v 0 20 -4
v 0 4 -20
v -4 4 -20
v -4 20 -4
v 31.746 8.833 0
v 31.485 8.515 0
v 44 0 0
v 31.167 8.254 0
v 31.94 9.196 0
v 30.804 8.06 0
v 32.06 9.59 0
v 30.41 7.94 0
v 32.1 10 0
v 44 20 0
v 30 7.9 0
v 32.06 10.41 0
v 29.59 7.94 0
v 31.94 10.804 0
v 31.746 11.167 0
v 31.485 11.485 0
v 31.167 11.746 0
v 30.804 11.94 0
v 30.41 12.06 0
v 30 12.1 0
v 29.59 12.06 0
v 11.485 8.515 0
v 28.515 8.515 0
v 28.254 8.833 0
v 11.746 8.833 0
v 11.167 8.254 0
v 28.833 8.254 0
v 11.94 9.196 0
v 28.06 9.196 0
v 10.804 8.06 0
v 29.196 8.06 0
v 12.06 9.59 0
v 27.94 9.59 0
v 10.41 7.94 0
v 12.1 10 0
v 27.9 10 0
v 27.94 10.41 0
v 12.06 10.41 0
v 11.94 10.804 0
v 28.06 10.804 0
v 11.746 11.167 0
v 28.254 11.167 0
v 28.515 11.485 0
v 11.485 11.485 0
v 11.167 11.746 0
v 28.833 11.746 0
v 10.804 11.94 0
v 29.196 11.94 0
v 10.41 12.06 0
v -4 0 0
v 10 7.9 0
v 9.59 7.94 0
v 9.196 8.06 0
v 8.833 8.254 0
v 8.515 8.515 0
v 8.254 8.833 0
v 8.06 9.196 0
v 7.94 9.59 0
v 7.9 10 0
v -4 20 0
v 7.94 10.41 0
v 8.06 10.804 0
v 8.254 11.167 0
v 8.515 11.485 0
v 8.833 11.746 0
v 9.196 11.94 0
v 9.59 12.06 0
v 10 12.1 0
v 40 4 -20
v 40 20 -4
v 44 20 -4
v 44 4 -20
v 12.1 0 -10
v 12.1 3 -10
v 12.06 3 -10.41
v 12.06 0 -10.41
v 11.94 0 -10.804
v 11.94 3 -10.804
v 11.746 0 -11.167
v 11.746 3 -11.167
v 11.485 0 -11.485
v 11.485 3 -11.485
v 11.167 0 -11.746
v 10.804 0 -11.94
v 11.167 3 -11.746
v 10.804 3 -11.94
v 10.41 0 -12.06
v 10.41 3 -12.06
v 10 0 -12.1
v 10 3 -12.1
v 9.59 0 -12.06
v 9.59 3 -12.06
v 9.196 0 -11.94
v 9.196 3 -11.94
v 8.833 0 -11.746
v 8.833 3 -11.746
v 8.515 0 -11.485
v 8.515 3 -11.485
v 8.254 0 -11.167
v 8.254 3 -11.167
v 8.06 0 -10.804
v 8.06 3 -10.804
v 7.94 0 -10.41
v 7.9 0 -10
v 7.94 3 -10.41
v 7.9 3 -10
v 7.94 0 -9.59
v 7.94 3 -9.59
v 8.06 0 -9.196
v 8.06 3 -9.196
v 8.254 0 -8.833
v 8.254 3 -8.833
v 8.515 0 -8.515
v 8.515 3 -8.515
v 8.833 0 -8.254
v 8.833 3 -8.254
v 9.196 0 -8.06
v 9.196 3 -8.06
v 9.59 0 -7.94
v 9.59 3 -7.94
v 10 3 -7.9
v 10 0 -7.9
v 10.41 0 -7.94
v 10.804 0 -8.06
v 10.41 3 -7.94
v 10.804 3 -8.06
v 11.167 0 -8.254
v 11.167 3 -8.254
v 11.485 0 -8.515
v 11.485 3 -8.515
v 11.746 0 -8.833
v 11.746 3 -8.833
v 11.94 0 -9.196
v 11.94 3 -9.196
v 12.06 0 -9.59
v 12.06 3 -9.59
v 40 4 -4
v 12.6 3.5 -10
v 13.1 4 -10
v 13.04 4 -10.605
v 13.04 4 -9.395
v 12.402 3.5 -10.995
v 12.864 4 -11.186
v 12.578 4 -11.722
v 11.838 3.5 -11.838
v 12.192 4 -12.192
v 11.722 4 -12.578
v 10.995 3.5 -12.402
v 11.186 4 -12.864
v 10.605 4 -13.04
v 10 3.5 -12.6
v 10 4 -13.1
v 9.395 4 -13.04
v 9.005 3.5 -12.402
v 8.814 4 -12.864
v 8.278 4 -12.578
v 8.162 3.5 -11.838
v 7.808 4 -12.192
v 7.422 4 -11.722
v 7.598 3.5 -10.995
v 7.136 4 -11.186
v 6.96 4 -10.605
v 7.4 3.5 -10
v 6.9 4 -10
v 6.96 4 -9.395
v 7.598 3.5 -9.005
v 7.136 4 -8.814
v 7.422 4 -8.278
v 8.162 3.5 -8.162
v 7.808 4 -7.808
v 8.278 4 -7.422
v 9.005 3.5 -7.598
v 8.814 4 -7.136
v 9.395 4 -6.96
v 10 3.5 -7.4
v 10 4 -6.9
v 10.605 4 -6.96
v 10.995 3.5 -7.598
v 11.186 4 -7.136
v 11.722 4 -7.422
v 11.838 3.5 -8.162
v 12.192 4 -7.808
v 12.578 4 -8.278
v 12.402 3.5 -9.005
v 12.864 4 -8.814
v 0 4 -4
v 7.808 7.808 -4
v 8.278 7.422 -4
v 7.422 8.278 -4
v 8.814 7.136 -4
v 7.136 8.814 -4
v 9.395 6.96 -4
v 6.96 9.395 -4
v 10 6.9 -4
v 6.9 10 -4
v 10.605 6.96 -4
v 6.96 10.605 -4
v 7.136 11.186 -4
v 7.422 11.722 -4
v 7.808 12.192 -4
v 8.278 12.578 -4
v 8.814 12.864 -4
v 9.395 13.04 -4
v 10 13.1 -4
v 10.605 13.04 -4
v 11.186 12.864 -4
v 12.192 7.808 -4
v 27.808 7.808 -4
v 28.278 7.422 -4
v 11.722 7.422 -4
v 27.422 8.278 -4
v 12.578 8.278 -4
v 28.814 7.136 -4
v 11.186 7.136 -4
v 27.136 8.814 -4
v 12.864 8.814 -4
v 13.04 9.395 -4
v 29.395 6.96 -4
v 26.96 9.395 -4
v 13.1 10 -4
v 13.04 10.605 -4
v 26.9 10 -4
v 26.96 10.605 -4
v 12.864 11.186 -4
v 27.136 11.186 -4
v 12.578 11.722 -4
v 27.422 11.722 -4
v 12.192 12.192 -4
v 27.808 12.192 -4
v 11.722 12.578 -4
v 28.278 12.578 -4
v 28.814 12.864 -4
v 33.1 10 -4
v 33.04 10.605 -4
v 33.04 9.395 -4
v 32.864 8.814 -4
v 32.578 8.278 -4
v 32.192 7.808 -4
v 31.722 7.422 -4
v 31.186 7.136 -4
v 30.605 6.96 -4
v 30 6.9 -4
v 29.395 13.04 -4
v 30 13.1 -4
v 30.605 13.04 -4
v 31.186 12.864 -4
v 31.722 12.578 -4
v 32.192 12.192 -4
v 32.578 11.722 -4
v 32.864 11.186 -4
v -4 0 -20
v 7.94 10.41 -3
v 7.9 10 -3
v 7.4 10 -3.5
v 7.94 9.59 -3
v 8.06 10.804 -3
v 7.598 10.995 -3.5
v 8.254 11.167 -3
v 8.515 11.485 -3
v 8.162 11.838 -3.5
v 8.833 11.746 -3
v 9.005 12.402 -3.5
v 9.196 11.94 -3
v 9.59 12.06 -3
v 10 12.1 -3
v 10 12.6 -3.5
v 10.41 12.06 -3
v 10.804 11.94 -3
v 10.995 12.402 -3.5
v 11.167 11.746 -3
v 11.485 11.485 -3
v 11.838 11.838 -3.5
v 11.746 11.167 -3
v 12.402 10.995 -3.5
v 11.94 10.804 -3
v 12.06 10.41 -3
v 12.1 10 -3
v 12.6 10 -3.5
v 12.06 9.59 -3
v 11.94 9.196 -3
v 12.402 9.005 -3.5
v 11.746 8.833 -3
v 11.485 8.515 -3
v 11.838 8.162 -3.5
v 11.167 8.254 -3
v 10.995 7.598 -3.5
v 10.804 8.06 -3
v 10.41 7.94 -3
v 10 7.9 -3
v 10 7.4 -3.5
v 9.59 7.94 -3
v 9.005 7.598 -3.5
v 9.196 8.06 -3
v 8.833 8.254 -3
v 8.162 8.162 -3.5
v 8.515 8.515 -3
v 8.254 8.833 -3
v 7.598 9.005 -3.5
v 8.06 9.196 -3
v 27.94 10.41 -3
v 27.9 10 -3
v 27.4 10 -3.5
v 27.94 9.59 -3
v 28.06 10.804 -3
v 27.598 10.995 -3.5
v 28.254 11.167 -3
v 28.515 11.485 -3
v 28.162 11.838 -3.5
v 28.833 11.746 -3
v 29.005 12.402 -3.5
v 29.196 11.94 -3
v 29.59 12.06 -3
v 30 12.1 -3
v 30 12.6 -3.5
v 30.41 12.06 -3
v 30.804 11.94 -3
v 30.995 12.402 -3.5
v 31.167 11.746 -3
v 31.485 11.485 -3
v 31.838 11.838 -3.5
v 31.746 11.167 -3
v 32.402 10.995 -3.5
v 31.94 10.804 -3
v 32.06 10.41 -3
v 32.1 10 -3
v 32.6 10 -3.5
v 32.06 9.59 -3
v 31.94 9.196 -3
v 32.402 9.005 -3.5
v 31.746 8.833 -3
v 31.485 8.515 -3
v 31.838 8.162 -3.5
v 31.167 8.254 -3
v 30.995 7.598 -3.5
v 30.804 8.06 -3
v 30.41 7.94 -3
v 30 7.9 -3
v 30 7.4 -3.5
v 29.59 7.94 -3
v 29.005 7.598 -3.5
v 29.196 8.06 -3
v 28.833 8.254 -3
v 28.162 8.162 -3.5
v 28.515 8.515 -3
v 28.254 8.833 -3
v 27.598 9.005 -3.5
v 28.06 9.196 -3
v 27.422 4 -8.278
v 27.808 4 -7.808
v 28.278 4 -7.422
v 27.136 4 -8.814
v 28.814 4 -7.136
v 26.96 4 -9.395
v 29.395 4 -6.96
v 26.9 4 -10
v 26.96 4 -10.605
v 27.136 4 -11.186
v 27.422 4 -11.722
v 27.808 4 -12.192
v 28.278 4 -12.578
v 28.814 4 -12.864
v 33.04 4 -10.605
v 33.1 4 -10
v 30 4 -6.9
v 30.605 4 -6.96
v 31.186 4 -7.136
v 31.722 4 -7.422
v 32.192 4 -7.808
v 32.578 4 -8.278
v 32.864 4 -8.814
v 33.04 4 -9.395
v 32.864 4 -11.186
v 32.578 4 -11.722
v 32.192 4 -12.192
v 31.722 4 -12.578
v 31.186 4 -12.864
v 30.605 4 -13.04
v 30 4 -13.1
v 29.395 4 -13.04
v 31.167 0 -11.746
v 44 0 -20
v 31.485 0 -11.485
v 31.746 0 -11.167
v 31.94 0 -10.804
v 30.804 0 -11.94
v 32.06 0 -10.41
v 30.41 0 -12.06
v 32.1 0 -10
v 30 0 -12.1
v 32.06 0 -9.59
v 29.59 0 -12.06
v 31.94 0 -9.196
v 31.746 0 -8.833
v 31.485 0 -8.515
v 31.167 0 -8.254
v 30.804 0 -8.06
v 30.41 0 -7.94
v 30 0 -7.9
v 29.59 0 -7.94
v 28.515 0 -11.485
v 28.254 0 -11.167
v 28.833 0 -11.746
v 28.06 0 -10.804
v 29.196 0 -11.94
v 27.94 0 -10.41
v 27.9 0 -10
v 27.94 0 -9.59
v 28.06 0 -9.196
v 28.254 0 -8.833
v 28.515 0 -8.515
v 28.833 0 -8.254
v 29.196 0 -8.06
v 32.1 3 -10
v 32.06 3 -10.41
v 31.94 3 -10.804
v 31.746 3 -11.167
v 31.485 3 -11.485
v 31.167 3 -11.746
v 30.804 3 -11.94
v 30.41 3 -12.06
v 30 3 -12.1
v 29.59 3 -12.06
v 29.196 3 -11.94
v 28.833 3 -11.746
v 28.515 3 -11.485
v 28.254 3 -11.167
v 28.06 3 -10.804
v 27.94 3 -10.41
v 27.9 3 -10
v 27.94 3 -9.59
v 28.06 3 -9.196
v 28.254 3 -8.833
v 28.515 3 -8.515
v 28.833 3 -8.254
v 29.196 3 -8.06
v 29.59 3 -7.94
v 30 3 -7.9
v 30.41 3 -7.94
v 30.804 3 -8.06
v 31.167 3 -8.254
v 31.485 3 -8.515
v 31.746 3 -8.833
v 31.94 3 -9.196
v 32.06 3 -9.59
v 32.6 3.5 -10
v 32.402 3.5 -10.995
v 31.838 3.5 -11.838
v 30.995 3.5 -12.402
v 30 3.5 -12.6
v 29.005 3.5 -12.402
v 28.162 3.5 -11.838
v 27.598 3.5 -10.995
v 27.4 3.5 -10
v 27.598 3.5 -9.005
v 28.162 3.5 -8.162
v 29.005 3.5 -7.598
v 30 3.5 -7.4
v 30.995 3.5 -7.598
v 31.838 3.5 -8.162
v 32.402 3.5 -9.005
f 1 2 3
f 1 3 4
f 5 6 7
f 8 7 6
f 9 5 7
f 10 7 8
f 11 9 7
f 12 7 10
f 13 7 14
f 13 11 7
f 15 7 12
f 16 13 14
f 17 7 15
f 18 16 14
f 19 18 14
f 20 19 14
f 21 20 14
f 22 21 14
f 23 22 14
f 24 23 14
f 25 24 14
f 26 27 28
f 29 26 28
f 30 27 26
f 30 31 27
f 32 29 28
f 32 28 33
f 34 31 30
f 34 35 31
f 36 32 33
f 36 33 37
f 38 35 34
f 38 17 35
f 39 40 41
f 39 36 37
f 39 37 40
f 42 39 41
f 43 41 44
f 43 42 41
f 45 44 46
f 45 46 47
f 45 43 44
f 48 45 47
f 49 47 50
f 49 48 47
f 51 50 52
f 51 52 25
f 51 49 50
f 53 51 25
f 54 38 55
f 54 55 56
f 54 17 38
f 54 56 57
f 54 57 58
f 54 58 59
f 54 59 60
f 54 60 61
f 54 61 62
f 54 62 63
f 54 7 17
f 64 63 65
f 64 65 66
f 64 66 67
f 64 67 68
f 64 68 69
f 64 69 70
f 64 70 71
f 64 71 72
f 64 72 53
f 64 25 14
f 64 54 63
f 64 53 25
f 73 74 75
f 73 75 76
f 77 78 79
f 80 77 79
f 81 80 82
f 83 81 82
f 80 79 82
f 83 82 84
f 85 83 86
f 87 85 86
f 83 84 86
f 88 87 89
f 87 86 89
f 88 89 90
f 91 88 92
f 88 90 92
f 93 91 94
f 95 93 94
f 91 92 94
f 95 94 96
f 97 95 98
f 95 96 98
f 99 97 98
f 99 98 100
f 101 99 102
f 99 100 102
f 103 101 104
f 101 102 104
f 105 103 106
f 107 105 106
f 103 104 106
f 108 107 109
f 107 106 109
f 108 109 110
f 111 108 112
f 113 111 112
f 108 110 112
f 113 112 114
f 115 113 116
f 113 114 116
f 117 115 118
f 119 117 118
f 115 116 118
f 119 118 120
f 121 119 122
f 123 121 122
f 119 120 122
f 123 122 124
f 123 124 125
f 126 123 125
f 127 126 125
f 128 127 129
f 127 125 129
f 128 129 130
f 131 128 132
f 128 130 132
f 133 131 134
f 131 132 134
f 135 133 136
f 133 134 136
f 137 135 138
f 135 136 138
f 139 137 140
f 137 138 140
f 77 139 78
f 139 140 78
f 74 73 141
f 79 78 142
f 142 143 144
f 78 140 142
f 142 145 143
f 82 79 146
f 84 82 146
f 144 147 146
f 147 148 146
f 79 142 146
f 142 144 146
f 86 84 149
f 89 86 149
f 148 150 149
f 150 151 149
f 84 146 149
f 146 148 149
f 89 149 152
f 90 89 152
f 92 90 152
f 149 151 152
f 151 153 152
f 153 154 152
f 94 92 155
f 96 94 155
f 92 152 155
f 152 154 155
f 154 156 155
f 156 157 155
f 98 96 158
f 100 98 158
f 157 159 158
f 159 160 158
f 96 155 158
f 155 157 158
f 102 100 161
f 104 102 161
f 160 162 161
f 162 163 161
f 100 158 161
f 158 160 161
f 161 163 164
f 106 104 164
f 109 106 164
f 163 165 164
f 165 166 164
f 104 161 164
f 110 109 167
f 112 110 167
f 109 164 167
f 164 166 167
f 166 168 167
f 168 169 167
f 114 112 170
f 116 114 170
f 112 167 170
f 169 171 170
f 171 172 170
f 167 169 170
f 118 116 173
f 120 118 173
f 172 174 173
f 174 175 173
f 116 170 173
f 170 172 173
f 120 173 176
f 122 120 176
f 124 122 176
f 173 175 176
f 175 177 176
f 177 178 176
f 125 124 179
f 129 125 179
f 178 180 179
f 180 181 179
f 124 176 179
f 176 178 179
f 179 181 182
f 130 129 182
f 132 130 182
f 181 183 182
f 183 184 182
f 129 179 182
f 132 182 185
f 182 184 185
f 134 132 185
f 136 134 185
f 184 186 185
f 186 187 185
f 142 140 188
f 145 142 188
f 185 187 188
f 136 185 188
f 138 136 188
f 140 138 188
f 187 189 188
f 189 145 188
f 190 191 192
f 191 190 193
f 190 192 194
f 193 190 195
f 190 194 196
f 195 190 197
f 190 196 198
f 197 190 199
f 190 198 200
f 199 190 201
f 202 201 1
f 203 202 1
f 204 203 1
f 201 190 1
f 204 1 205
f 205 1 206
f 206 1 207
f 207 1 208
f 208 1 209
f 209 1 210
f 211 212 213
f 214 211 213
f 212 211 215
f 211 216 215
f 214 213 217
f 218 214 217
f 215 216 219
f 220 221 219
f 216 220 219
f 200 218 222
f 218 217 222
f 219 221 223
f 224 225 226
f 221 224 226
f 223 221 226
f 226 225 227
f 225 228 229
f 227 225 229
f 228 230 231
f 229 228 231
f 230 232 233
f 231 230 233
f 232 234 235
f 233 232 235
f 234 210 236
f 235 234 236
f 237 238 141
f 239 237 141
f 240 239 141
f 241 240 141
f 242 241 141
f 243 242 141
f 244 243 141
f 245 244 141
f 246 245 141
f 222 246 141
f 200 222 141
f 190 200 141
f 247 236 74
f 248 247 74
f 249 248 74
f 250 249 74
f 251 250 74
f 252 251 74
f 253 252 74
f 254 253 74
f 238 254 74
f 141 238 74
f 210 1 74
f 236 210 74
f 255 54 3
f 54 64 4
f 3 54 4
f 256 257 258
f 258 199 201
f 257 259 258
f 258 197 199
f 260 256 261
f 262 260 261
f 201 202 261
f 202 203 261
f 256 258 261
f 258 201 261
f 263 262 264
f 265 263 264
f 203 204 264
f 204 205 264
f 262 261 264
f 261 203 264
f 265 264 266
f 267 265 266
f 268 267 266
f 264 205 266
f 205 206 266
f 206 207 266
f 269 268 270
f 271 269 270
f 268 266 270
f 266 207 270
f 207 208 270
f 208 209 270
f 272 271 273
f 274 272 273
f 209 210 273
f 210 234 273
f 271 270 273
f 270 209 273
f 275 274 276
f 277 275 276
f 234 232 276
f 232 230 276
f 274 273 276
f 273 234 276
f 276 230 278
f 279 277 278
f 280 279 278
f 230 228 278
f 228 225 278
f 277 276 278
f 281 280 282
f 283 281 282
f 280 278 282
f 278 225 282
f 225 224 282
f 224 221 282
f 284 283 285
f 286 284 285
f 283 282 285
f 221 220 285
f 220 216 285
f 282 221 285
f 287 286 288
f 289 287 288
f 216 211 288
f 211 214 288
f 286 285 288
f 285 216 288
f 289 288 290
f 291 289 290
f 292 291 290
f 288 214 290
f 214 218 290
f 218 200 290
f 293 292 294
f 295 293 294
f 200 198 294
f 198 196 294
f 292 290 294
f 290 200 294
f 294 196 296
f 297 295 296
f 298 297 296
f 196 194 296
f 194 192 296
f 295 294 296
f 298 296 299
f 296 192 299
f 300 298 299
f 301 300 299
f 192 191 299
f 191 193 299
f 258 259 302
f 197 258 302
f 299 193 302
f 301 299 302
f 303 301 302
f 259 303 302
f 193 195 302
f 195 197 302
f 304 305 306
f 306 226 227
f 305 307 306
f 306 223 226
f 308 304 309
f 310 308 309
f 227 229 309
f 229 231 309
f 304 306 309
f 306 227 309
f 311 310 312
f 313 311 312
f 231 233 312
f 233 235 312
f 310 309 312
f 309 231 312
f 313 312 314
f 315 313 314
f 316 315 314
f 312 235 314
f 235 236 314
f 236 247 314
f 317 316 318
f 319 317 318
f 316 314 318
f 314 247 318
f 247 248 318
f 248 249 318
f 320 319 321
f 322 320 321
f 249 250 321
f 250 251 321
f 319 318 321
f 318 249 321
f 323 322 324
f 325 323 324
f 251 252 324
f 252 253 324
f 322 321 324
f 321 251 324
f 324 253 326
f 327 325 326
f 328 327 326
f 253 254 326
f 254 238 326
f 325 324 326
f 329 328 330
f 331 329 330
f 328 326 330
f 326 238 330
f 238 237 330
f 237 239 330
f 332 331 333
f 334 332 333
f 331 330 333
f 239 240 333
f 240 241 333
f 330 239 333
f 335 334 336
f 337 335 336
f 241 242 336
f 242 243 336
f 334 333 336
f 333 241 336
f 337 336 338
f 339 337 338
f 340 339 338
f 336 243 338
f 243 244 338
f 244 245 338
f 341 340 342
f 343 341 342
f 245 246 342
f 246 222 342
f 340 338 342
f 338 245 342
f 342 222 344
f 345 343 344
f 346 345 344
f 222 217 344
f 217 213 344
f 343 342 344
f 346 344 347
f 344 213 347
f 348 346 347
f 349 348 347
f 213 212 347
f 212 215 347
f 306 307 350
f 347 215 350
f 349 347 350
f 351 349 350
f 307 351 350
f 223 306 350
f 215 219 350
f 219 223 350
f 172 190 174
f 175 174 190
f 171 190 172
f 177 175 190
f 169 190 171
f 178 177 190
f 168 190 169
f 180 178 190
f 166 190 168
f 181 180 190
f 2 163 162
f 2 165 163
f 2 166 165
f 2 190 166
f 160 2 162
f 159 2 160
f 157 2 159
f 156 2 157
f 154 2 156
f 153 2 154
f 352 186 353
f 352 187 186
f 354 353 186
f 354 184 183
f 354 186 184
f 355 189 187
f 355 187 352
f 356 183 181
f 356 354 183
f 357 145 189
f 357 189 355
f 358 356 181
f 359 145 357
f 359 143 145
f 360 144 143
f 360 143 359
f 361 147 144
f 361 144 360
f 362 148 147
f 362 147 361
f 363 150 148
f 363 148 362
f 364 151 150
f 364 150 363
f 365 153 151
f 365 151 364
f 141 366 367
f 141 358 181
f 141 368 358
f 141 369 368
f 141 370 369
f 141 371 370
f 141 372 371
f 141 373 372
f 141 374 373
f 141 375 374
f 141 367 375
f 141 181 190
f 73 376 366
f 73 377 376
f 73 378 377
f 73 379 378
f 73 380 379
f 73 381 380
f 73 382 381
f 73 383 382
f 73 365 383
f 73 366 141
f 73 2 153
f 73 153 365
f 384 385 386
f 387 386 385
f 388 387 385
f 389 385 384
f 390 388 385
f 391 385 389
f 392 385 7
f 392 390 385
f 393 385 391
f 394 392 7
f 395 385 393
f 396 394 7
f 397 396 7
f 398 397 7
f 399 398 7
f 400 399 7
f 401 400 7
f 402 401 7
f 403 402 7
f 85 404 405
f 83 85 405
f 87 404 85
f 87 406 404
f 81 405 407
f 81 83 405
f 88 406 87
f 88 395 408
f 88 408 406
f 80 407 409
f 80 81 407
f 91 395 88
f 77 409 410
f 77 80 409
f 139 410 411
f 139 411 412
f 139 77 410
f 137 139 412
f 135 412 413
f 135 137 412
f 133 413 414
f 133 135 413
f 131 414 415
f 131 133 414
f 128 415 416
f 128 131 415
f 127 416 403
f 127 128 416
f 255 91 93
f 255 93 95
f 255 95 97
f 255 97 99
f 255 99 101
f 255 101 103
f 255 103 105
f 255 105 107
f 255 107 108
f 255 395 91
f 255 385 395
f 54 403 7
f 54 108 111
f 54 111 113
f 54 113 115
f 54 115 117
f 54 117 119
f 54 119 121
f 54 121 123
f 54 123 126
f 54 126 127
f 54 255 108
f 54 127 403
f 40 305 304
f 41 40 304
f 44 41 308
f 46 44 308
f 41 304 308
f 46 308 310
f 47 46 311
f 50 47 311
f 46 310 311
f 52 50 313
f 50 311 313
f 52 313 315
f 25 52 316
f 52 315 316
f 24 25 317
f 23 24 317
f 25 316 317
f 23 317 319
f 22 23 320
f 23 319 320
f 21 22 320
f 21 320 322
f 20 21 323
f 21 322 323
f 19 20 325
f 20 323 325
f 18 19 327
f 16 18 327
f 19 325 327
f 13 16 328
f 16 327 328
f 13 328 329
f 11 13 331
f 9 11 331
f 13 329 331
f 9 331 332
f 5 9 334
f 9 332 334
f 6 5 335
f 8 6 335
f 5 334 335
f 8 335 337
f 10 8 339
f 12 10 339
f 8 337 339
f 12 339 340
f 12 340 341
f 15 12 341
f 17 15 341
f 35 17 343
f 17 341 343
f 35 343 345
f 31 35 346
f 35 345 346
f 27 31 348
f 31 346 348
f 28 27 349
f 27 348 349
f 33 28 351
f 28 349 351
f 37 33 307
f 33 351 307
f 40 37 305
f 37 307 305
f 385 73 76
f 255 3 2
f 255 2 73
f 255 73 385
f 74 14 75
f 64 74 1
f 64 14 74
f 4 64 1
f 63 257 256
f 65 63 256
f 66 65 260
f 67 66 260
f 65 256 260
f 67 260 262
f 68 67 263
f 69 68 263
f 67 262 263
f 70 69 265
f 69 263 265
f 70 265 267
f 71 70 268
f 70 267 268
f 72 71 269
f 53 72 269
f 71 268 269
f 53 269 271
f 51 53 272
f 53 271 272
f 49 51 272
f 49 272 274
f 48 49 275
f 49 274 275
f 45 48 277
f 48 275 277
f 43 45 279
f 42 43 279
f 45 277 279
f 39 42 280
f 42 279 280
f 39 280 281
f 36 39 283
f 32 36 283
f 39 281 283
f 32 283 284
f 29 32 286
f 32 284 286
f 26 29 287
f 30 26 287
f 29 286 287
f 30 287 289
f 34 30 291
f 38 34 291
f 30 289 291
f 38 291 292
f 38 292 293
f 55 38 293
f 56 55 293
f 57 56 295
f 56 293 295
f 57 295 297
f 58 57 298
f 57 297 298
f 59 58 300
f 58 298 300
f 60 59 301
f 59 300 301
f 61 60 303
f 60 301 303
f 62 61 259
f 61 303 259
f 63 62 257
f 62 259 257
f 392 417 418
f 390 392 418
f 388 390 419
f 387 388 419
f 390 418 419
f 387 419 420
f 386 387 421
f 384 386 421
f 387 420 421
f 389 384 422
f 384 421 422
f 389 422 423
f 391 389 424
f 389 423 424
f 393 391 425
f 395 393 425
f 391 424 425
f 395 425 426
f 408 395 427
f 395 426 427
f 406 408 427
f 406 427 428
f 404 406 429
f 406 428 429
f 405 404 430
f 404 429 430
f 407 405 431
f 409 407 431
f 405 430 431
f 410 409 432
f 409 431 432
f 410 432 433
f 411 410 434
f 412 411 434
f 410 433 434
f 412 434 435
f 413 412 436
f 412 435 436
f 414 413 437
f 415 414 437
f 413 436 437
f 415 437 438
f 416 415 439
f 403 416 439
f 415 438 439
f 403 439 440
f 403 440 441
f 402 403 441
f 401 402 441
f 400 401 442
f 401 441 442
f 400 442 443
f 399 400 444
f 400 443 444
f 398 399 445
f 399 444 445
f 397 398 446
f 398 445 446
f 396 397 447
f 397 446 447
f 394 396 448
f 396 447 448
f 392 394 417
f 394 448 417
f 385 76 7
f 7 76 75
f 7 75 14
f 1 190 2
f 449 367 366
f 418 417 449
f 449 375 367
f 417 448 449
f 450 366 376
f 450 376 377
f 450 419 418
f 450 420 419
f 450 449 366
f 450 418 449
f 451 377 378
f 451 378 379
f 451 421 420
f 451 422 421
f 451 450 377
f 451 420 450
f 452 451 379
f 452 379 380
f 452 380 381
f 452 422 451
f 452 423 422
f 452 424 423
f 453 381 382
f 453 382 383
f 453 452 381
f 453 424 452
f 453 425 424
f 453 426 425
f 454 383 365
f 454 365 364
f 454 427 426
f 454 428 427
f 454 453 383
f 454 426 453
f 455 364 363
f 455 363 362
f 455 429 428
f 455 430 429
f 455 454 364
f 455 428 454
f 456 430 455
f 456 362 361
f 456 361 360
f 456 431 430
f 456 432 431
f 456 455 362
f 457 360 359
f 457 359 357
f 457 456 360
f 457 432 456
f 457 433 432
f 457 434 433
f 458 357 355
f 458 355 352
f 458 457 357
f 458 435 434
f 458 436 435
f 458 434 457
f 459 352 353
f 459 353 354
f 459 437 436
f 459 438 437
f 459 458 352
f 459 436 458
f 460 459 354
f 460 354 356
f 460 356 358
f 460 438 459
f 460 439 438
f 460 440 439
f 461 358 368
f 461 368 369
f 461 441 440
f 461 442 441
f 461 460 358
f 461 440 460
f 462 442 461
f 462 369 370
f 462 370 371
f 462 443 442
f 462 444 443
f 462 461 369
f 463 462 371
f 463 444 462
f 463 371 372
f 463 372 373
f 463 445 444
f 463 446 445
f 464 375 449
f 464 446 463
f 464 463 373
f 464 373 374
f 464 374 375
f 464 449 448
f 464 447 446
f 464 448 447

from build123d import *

# Parameters (mm, degrees)
SKETCH1_W           = 40
SKETCH1_H           = 20
BOSS_EXTRUDE1_DEPTH = 4
SKETCH2_R           = 2.1
CUT_EXTRUDE1_DEPTH  = 4
SKETCH3_W           = 40
SKETCH3_H           = 20
BOSS_EXTRUDE3_DEPTH = 4
SKETCH4_R           = 2.1
CUT_EXTRUDE2_DEPTH  = 4
BOSS_EXTRUDE4_DEPTH = 4
BOSS_EXTRUDE5_DEPTH = 4
CHAMFER1_SIZE       = 1


with BuildPart() as part:
    # Sketch1 → Boss-Extrude1 (new body)
    with BuildSketch(Plane(origin=(0, 0, 0), x_dir=(1, 0, 0), z_dir=(0, 1, 0))):
        with Locations((20, 10)):
            Rectangle(SKETCH1_W, SKETCH1_H)
    extrude(amount=BOSS_EXTRUDE1_DEPTH)

    # Sketch2 → Cut-Extrude1 (cut)
    with BuildSketch(Plane(origin=(0, 4, 0), x_dir=(1, 0, 0), z_dir=(0, 1, 0))):
        with Locations((10, 10)):
            Circle(SKETCH2_R)
        with Locations((30, 10)):
            Circle(SKETCH2_R)
    extrude(amount=-CUT_EXTRUDE1_DEPTH, mode=Mode.SUBTRACT)

    # Sketch3 → Boss-Extrude3 (add)
    with BuildSketch(Plane.XY):
        with Locations((20, 10)):
            Rectangle(SKETCH3_W, SKETCH3_H)
    extrude(amount=-BOSS_EXTRUDE3_DEPTH)

    # Sketch4 → Cut-Extrude2 (cut)
    with BuildSketch(Plane(origin=(0, 0, -4), x_dir=(-1, 0, 0), z_dir=(0, 0, -1))):
        with Locations((-30, 10)):
            Circle(SKETCH4_R)
        with Locations((-10, 10)):
            Circle(SKETCH4_R)
    extrude(amount=-CUT_EXTRUDE2_DEPTH, mode=Mode.SUBTRACT)

    # Sketch5 → Boss-Extrude4 (add)
    with BuildSketch(Plane.ZY):
        Polygon((-20, 4), (-4, 20), (0, 20), (0, 0), (-20, 0), align=None)
    extrude(amount=BOSS_EXTRUDE4_DEPTH)

    # Sketch6 → Boss-Extrude5 (add)
    with BuildSketch(Plane(origin=(40, 0, 0), x_dir=(0, 0, -1), z_dir=(1, 0, 0))):
        Polygon((0, 20), (4, 20), (20, 4), (20, 0), (0, 0), align=None)
    extrude(amount=BOSS_EXTRUDE5_DEPTH)

    # Chamfer1
    chamfer1_edges = [part.edges().sort_by_distance(p)[0] for p in [
        (7.9, 4, -10),
        (27.9, 4, -10),
        (32.1, 10, -4),
        (12.1, 10, -4),
    ]]
    chamfer(chamfer1_edges, length=CHAMFER1_SIZE)


solid = part.part
